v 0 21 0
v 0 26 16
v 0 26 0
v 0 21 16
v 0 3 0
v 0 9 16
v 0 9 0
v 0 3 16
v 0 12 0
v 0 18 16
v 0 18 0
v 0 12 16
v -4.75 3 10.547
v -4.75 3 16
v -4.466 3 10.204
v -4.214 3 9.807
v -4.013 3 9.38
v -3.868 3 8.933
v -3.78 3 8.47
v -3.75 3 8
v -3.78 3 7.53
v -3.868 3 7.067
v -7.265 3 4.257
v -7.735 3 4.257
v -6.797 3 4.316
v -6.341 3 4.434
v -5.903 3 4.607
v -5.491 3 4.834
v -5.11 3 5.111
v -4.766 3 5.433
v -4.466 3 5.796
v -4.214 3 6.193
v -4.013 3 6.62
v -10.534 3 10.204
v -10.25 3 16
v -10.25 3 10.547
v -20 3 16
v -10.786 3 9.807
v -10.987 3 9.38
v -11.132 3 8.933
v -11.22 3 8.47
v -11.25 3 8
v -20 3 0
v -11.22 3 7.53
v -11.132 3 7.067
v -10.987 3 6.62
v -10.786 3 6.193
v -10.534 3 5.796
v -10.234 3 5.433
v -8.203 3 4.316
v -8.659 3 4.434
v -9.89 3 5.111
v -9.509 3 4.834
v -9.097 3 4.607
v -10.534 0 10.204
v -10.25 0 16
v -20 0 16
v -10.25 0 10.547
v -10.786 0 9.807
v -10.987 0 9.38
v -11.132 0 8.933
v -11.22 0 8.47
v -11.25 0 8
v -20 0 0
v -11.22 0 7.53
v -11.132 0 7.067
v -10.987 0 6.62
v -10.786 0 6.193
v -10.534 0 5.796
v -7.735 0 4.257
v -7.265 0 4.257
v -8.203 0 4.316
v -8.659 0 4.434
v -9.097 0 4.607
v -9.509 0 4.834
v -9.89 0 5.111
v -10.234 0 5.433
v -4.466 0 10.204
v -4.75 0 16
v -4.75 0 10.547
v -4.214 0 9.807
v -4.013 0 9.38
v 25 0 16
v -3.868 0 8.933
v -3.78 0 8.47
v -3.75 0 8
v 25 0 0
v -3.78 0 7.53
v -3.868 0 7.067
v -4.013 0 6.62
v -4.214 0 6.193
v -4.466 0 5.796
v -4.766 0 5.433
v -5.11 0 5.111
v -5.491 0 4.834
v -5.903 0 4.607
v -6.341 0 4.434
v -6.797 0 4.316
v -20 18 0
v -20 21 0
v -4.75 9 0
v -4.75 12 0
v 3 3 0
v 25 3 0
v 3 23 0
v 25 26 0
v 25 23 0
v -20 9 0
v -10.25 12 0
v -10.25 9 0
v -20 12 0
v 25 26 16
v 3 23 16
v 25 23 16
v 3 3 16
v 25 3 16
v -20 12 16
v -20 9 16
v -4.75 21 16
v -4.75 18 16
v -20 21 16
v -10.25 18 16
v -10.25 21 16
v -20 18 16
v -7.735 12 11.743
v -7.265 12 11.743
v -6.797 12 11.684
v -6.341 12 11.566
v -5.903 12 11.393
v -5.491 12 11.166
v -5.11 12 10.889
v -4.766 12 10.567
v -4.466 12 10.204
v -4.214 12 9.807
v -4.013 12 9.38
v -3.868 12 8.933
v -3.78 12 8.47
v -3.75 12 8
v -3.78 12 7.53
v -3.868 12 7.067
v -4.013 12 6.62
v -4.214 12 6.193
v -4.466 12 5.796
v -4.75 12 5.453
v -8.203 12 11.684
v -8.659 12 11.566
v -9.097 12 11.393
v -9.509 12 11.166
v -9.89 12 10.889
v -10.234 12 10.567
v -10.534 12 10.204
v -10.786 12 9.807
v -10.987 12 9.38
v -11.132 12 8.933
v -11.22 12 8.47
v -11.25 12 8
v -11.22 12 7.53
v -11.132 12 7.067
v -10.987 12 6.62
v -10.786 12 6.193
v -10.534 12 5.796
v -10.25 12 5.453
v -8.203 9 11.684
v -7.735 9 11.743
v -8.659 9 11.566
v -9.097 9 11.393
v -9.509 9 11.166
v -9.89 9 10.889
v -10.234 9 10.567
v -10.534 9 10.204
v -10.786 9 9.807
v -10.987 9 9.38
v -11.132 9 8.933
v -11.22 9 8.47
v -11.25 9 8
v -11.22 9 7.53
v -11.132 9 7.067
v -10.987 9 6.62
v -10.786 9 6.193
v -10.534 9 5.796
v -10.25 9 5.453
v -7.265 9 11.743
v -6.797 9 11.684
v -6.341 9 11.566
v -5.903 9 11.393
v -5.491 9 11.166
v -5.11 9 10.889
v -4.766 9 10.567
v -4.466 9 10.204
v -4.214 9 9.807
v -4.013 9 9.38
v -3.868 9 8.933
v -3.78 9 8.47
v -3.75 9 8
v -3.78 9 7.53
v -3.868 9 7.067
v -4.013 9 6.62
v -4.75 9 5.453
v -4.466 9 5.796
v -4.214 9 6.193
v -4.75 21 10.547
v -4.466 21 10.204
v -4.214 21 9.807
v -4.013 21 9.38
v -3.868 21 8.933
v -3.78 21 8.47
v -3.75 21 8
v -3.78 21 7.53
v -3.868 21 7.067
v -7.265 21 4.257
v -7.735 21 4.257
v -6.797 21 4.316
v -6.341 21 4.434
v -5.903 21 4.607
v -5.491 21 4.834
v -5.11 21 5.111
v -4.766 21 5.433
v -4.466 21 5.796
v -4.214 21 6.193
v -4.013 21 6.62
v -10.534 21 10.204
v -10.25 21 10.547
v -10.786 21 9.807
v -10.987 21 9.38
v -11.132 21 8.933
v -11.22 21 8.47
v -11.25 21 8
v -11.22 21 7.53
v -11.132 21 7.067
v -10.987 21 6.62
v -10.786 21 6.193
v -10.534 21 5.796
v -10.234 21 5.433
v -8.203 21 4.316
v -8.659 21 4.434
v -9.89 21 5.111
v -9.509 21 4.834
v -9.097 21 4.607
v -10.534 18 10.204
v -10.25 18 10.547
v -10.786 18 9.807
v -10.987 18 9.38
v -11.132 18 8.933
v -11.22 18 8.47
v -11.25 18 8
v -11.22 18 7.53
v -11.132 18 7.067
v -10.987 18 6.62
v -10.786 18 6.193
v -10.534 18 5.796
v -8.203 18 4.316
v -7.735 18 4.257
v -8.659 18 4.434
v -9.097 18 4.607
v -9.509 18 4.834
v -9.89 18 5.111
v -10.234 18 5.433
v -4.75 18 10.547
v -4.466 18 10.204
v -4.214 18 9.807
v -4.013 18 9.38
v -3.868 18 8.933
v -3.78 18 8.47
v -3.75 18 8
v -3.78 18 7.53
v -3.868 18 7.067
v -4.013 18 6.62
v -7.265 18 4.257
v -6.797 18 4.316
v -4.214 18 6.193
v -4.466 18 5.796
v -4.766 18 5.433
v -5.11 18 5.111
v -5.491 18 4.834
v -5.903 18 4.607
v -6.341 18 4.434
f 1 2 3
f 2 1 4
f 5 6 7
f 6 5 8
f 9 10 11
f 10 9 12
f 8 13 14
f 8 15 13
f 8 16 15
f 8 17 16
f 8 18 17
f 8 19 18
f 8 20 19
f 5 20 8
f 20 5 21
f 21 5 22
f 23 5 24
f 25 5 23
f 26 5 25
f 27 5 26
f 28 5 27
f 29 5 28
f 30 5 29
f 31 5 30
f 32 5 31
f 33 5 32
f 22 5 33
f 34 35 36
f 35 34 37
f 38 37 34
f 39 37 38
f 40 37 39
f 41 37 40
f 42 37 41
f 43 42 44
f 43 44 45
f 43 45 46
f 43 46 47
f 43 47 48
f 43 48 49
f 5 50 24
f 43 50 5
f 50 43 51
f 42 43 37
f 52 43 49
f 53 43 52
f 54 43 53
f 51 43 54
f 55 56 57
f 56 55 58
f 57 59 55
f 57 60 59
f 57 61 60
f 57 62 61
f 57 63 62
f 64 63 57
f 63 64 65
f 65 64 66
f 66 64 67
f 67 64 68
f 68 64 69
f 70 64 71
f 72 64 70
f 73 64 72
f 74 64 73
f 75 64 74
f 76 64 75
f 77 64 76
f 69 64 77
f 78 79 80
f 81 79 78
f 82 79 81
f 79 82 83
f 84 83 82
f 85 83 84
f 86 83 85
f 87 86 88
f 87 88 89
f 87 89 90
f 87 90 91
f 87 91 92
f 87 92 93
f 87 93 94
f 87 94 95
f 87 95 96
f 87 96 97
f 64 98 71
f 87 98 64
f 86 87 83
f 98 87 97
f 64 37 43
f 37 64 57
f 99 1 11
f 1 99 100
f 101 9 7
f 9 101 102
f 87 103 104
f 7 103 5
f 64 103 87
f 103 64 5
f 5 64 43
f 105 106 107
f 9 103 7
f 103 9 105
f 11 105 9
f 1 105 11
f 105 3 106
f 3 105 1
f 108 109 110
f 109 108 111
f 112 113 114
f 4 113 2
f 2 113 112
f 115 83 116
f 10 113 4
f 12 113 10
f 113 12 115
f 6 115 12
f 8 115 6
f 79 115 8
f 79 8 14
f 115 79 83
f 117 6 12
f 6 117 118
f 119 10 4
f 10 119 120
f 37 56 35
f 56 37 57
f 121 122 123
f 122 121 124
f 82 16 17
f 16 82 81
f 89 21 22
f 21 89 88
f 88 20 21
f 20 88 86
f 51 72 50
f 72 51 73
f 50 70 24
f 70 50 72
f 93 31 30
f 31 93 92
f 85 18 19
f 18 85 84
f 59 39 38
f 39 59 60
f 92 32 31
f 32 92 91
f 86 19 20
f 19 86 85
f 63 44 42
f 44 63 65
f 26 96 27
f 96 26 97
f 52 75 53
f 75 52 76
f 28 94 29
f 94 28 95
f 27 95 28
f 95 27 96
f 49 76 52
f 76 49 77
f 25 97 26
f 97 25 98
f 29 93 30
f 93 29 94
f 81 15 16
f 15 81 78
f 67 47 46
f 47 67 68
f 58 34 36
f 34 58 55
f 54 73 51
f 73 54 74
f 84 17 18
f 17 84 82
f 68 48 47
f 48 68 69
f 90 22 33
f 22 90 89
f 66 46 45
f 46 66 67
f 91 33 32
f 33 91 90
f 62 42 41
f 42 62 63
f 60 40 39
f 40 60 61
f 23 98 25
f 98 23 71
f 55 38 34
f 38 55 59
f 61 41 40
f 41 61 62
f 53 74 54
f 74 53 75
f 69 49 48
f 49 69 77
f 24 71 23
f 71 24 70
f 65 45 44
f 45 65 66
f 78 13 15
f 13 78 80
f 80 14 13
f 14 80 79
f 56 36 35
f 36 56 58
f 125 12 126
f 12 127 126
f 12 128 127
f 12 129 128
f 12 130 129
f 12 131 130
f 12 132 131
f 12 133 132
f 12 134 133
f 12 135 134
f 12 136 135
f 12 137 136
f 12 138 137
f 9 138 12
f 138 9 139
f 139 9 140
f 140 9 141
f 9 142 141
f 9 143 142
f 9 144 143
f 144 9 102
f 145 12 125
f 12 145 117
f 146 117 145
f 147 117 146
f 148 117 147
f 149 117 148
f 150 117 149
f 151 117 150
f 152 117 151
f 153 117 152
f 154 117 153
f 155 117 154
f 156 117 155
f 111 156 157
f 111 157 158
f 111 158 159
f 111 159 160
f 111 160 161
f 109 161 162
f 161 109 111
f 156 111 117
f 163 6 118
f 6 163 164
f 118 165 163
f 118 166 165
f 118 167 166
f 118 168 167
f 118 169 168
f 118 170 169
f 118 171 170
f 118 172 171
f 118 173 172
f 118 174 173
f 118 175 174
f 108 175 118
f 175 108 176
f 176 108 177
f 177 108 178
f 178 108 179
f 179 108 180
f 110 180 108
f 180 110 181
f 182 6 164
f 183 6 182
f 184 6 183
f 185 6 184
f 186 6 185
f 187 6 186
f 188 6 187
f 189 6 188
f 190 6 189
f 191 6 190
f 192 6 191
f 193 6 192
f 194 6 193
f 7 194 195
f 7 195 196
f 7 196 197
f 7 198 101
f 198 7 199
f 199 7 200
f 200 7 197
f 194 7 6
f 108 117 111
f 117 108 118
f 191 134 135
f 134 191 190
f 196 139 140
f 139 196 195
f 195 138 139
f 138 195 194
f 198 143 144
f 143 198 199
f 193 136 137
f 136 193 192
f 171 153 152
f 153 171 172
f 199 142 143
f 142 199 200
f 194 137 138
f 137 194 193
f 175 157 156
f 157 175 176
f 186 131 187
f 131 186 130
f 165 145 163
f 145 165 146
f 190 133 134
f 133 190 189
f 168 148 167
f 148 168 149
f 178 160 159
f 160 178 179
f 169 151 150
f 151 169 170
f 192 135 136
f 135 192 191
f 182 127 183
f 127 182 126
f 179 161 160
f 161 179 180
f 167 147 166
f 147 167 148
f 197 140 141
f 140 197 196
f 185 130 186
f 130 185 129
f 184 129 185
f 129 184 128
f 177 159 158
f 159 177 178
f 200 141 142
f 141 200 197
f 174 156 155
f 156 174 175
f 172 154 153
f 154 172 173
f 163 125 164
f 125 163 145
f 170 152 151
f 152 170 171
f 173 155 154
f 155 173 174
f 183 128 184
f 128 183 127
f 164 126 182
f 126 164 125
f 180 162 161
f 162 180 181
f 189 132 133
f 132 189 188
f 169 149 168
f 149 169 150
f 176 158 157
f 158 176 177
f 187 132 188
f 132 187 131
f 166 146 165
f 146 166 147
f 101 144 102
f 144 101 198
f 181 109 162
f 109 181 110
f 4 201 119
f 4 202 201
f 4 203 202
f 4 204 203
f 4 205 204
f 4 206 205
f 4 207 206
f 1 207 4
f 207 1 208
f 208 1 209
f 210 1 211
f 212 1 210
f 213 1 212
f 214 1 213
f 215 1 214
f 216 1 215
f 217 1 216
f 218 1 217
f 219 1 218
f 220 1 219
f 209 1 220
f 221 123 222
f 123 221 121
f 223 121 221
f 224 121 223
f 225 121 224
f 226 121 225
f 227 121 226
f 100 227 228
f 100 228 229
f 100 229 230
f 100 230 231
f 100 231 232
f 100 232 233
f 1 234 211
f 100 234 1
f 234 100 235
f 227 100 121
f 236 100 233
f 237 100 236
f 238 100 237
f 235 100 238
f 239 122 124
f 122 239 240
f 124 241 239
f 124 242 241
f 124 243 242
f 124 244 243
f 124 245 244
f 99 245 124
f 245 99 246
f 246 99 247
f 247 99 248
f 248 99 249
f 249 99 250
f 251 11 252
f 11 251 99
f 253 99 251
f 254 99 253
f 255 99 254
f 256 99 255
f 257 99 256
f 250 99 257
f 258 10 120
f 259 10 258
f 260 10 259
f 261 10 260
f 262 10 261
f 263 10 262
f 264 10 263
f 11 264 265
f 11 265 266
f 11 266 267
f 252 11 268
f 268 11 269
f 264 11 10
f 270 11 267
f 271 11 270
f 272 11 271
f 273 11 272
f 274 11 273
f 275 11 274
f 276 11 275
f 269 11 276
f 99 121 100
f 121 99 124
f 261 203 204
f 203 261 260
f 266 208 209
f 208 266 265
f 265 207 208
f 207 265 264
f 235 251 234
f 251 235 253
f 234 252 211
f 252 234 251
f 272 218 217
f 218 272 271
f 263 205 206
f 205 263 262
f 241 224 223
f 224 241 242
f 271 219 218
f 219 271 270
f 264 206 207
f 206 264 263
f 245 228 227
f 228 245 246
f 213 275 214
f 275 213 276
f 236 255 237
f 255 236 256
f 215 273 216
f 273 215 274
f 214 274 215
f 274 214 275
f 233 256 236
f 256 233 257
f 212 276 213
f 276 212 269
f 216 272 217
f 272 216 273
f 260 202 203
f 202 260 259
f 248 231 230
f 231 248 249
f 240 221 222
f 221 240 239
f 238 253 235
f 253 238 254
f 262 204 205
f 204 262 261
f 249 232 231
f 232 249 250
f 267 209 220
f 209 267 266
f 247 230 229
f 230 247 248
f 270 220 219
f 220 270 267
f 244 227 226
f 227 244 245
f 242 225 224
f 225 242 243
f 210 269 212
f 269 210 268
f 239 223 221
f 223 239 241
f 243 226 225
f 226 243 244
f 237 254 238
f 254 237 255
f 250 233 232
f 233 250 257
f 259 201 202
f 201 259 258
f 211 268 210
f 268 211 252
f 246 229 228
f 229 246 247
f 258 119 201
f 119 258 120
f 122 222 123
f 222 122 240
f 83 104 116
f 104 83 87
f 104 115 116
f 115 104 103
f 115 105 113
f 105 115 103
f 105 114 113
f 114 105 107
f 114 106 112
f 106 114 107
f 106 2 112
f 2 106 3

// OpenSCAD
shelfThickness = 20; //Thickness of the shelf (mm)
wallThickness = 3; //Wall thickness of the cable holder (mm)
width = 16; //Width of the cable holder (mm)
length = 25; //Lengt of the cable holder over the shelf(mm)
cableThickness = 5; //The diameter of the cable to be held (mm)
seperation = 1.2*cableThickness;
$fn = 2*25;

translate([0,0,width]){
    rotate([-90,0,0]){
        cube([length,width,wallThickness]);
        
        translate([0,0,wallThickness]){
            cube([wallThickness,width,shelfThickness]);
        }
        translate([0,0,wallThickness+shelfThickness]){
            cube([length,width,wallThickness]);
        }
        
        depth = 4 * cableThickness;
        difference(){
            difference(){
                translate([-depth,0,0]){
                    cube([depth,width,wallThickness]);
                }
                translate([-1.5 * cableThickness, width / 2, -1]){
                      cylinder(wallThickness +2, 0.75*cableThickness, 0.75*cableThickness);
                }
            }
            translate([(-1.5 * cableThickness)-(0.55*cableThickness),-1,-1]){
                 cube([1.1*cableThickness,
                (((width)/2)+2),
                wallThickness +2]);
            }
        }
        if (1*seperation+2*wallThickness <= shelfThickness + 2*wallThickness){
            difference(){
                difference(){
                    translate([-depth,0,wallThickness+(seperation)]){
                        cube([depth,width,wallThickness]);
                    }
                    translate([-1.5 * cableThickness, width / 2,wallThickness+(seperation)-1]){
                          cylinder(wallThickness +2, 0.75*cableThickness, 0.75*cableThickness);
                    }
                }
                translate([(-1.5 * cableThickness)-(0.55*cableThickness),(width/2),wallThickness+(seperation)-1]){
                     cube([1.1*cableThickness,
                    (((width)/2)+1),
                    wallThickness +2]);
                }
            }
        }
        if (2*seperation+3*wallThickness <= shelfThickness + 2*wallThickness){
            difference(){
                difference(){
                    translate([-depth,0,2*(wallThickness+(seperation))]){
                        cube([depth,width,wallThickness]);
                    }
                    translate([-1.5 * cableThickness, width / 2, (2*(wallThickness+(seperation)))-1]){
                          cylinder(wallThickness +2, 0.75*cableThickness, 0.75*cableThickness);
                    }
                }
                translate([(-1.5 * cableThickness)-(0.55*cableThickness),-1,(2*(wallThickness+(seperation)))-1]){
                     cube([1.1*cableThickness,
                    ((width/2)+2),
                    wallThickness +2]);
                }
            }
        }
    }

}
